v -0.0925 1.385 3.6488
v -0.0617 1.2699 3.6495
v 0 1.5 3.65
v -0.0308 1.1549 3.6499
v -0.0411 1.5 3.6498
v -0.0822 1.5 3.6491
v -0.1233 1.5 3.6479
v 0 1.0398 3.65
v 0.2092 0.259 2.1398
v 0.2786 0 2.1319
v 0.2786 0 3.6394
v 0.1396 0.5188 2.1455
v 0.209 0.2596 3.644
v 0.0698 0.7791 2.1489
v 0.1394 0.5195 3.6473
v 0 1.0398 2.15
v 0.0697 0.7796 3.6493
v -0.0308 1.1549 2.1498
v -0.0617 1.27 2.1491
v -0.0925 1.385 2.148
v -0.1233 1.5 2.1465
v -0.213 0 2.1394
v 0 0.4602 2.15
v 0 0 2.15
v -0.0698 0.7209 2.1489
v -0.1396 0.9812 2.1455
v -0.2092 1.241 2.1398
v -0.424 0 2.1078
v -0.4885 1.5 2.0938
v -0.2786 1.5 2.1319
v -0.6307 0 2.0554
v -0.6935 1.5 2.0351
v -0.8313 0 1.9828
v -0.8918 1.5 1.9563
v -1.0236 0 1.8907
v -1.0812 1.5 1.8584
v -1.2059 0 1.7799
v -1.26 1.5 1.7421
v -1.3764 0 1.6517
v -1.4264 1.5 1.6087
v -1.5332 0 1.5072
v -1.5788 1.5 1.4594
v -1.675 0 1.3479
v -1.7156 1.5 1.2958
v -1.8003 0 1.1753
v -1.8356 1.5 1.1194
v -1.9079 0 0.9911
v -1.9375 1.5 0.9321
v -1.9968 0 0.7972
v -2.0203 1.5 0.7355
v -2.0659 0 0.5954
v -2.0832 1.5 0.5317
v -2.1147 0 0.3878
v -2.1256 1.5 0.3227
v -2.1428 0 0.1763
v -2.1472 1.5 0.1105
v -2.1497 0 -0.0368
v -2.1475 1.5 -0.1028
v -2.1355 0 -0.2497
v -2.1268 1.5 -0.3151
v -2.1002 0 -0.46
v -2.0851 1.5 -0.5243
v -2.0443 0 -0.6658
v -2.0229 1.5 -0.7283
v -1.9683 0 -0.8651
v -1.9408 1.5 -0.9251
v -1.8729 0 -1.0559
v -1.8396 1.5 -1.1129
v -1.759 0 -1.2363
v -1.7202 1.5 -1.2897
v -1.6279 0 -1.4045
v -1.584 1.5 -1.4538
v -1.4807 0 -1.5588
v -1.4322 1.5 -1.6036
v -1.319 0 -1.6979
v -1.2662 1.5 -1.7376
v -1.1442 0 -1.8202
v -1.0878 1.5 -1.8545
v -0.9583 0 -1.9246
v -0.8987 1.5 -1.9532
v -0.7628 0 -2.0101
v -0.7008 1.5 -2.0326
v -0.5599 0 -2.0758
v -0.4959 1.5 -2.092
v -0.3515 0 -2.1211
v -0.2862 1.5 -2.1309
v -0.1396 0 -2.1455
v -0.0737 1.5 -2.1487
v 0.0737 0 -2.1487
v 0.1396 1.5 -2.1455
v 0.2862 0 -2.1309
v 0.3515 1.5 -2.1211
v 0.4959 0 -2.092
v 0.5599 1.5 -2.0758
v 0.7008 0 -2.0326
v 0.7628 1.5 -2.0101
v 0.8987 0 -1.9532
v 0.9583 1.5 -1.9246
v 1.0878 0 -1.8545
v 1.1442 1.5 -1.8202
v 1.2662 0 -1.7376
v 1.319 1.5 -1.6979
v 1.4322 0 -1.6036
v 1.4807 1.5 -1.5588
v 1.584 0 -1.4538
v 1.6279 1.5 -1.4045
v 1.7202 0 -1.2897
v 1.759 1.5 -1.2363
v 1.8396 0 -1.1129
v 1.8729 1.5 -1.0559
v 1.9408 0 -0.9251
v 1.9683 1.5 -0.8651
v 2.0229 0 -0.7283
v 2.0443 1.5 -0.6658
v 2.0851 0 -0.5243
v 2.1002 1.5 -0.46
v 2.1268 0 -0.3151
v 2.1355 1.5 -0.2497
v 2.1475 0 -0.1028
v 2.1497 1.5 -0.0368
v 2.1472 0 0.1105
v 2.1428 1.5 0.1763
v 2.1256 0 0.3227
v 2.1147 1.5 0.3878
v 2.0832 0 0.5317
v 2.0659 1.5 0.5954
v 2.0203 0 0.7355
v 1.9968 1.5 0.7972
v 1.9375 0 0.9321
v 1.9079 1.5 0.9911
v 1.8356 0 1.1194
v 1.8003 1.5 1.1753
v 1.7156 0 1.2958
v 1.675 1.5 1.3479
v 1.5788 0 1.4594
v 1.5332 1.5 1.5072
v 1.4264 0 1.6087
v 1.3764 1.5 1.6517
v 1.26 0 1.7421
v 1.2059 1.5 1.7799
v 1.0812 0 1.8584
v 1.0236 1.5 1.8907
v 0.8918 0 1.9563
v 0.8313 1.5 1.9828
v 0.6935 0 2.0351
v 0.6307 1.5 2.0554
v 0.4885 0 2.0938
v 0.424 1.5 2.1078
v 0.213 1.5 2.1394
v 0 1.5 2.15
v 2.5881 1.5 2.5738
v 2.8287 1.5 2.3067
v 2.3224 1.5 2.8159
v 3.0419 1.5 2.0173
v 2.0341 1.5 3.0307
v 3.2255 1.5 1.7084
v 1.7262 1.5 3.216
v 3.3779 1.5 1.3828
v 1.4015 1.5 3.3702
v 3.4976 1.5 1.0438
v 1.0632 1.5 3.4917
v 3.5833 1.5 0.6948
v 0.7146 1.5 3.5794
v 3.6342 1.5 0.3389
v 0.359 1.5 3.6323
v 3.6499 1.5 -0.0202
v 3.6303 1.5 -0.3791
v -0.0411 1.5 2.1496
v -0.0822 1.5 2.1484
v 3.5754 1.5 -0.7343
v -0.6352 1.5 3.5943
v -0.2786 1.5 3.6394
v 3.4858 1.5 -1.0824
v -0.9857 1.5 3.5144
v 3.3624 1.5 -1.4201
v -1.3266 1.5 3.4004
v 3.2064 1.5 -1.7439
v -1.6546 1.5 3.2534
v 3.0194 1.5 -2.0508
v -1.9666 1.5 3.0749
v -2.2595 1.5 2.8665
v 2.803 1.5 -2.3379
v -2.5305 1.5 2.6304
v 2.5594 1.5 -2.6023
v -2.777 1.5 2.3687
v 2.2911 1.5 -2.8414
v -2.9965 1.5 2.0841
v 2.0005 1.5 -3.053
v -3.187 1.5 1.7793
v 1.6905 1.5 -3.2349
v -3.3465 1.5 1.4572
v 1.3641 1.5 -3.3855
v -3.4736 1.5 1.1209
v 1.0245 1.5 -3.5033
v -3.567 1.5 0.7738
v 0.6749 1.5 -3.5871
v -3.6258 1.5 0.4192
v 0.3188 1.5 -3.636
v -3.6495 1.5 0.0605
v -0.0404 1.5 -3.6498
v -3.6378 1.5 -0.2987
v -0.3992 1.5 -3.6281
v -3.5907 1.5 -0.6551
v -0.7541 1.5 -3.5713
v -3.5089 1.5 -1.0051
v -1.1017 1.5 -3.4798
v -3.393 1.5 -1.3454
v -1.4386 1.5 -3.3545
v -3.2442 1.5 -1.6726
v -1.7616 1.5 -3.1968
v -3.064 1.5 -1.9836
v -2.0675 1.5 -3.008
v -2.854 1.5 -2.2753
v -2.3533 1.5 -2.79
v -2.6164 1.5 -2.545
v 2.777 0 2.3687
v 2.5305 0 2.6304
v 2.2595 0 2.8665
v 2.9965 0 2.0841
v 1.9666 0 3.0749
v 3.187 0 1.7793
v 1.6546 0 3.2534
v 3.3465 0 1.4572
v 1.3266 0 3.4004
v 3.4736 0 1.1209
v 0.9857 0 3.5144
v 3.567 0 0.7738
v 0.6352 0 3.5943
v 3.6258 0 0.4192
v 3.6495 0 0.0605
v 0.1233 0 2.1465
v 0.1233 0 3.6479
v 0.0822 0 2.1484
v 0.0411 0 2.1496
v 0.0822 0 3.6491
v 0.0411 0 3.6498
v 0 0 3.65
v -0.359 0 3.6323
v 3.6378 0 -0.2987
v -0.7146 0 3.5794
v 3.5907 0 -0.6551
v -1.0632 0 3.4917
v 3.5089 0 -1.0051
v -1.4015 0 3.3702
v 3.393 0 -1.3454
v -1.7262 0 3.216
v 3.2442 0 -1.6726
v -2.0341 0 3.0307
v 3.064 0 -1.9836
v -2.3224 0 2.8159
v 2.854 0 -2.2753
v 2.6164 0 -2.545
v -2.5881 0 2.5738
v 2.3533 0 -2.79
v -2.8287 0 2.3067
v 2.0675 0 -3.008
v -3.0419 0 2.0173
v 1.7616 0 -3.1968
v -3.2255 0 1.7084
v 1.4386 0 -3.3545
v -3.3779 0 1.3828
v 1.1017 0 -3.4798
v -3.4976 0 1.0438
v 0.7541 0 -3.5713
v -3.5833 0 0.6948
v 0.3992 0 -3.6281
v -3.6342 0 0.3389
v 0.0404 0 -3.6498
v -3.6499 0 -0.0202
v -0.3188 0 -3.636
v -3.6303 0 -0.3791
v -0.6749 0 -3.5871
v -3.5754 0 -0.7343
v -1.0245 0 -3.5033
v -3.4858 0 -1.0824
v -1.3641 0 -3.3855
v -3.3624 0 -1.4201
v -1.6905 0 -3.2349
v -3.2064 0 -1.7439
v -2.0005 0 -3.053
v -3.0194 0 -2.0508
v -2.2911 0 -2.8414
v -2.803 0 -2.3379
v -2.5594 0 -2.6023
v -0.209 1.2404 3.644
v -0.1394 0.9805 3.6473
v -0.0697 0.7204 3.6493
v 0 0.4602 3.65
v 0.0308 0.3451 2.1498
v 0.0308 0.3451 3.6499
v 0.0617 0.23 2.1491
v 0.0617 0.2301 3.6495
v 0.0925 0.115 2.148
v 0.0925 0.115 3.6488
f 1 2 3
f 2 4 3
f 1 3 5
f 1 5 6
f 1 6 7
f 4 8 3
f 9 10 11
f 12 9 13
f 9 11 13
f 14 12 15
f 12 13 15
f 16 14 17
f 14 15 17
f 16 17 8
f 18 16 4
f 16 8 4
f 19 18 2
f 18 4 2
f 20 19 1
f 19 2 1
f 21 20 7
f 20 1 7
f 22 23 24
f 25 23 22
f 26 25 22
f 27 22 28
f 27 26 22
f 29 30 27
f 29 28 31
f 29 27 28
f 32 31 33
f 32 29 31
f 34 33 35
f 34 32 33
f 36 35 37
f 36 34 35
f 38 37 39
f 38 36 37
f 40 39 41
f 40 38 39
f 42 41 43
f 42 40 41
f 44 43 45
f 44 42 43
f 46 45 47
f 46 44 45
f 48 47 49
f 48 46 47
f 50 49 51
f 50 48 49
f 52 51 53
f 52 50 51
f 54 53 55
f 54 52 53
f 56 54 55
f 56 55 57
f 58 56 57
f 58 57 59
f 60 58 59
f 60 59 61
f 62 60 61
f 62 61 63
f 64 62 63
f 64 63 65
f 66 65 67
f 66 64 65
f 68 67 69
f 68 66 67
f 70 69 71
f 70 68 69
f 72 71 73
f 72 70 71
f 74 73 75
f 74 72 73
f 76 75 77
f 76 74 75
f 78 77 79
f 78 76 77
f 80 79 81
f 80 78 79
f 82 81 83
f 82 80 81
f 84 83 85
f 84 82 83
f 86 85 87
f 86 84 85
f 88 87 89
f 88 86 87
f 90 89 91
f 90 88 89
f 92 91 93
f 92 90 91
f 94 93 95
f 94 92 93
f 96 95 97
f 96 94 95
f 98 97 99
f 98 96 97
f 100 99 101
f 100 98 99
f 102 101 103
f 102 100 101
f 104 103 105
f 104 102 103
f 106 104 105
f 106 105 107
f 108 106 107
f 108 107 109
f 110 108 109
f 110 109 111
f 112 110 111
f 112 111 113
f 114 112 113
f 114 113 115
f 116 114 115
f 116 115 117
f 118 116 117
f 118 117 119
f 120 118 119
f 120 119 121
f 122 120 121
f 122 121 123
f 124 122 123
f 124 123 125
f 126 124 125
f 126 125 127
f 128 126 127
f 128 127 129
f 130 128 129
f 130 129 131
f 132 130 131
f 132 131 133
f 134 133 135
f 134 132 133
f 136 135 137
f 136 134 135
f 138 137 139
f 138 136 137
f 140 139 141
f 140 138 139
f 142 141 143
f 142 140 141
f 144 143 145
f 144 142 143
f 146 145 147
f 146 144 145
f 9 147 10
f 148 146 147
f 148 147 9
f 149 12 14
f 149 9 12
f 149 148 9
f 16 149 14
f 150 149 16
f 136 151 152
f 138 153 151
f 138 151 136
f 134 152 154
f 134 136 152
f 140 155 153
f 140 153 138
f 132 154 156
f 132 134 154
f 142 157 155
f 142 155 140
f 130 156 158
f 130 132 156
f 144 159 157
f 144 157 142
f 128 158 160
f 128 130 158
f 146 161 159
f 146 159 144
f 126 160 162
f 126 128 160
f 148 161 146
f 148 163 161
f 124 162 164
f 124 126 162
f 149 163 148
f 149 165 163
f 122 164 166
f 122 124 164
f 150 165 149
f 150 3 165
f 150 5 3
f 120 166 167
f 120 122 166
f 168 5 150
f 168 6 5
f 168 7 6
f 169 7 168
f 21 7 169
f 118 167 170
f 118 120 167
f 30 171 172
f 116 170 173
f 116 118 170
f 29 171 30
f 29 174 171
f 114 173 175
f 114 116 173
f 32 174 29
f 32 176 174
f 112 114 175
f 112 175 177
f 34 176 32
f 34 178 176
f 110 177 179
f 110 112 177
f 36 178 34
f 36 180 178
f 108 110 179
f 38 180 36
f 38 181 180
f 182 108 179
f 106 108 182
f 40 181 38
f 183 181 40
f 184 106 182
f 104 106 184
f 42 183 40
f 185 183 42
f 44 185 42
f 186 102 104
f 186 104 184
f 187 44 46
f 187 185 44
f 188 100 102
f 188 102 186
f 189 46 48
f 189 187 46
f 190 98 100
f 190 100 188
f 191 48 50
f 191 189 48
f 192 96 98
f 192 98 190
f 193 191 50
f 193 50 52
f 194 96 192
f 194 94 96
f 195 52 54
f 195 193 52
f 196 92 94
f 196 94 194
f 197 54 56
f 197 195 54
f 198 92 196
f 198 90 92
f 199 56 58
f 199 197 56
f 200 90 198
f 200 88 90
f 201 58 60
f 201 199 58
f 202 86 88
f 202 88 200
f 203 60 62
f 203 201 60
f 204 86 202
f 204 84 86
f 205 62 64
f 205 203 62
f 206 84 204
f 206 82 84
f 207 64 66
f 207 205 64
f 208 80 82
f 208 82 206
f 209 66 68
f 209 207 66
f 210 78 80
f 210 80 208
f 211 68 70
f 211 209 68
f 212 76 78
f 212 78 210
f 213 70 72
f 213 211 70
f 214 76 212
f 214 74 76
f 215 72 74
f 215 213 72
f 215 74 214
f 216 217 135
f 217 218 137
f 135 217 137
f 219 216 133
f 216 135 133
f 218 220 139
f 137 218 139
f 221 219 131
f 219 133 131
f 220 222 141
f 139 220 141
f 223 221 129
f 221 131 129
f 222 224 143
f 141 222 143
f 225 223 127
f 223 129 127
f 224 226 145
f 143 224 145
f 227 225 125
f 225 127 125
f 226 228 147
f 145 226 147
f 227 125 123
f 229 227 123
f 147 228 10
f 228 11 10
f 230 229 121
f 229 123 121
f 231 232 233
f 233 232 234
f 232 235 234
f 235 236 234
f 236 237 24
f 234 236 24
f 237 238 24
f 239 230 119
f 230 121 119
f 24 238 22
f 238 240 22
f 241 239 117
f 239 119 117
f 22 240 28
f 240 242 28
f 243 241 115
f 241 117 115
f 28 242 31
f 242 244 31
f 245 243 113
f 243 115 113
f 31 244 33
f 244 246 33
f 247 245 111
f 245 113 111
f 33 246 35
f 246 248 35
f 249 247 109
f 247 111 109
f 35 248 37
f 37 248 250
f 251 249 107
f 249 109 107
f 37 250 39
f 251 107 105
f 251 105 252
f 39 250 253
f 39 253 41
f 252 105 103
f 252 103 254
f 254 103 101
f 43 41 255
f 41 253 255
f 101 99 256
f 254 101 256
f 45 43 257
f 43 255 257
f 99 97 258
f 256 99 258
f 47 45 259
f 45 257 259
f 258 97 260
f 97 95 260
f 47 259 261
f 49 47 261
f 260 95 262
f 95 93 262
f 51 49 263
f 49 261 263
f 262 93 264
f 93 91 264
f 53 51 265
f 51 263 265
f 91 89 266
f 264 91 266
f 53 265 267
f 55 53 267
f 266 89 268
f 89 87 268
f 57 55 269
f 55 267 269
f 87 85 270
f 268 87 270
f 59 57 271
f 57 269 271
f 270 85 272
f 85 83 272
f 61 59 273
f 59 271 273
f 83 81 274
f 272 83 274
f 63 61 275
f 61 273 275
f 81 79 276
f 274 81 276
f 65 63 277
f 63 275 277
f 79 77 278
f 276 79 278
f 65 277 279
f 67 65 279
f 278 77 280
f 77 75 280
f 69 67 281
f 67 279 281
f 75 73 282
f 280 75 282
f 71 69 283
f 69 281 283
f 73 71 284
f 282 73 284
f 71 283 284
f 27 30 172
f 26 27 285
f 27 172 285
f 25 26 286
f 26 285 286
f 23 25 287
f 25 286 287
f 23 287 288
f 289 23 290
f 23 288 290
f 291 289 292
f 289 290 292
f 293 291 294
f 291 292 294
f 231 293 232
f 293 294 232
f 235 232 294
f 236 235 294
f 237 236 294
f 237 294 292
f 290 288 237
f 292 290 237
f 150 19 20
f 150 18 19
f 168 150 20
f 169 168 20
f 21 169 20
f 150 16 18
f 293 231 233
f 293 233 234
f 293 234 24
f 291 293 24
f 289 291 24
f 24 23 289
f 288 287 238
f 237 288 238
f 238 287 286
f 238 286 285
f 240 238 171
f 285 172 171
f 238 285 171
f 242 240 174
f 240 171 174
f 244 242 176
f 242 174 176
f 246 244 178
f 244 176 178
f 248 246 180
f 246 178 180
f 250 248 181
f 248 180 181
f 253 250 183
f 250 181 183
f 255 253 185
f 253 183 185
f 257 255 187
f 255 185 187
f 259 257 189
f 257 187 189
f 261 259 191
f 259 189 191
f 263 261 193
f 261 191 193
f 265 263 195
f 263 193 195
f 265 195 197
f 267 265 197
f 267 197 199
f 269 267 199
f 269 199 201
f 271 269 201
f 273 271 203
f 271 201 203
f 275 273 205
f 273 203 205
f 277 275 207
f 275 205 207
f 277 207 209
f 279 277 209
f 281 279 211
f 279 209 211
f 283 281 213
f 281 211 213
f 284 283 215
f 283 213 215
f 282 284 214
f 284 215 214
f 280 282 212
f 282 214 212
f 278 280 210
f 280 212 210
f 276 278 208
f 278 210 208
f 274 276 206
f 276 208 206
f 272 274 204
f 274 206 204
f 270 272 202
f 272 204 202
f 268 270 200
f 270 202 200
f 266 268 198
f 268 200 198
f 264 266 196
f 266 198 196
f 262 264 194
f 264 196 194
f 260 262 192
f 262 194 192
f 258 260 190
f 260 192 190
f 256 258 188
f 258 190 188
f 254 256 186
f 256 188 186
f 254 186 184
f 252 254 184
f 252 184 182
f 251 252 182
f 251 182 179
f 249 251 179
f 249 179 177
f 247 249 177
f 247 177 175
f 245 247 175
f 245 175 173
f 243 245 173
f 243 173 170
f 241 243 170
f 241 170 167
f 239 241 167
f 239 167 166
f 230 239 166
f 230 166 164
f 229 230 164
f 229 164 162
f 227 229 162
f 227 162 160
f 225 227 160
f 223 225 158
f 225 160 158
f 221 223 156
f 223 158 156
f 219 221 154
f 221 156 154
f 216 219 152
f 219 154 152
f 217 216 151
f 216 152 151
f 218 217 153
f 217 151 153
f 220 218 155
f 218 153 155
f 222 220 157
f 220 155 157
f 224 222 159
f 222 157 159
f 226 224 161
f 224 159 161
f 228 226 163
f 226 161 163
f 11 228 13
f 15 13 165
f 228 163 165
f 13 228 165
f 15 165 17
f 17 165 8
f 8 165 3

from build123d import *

# Parameters (mm, degrees)
ESQUISSE1_W      = 1.5
ESQUISSE1_H      = 1.5
FENTE_REACH      = 10.298
FENTE_END_RADIUS = 2.15


with BuildPart() as part:
    # Esquisse1 → Base (revolve)
    with BuildSketch(Plane.XY, mode=Mode.PRIVATE) as base_sk:
        with Locations((2.9, 0.75)):
            Rectangle(ESQUISSE1_W, ESQUISSE1_H)
    revolve(base_sk.sketch.rotate(Axis((0, 0.5, 0), (0, -1, 0)), 90), axis=Axis((0, 0.5, 0), (0, -1, 0)))

    # Fente: up to this cylinder (the profile starts outside it)
    fente_end = Plane(origin=(0, 0.75, 0), z_dir=(0, 1, 0)) * Cylinder(FENTE_END_RADIUS, 25.896, mode=Mode.PRIVATE)
    # Esquisse2 → Fente (cut, up to the surface)
    with BuildSketch(Plane.XY.offset(3.65), mode=Mode.PRIVATE) as fente_sk1:
        Polygon((-0.474368226, 2.230588572), (-0.072444437, 0.730588572), (0.329479352, -0.769411428), (0.474368226, -0.730588572), (0.072444437, 0.769411428), (-0.329479352, 2.269411428), align=None)
    fente_tool1 = extrude(fente_sk1.sketch, amount=-FENTE_REACH, mode=Mode.PRIVATE) - fente_end
    add(fente_tool1.solids().sort_by_distance((0, 0.75, 3.65))[0], mode=Mode.SUBTRACT)


solid = part.part
